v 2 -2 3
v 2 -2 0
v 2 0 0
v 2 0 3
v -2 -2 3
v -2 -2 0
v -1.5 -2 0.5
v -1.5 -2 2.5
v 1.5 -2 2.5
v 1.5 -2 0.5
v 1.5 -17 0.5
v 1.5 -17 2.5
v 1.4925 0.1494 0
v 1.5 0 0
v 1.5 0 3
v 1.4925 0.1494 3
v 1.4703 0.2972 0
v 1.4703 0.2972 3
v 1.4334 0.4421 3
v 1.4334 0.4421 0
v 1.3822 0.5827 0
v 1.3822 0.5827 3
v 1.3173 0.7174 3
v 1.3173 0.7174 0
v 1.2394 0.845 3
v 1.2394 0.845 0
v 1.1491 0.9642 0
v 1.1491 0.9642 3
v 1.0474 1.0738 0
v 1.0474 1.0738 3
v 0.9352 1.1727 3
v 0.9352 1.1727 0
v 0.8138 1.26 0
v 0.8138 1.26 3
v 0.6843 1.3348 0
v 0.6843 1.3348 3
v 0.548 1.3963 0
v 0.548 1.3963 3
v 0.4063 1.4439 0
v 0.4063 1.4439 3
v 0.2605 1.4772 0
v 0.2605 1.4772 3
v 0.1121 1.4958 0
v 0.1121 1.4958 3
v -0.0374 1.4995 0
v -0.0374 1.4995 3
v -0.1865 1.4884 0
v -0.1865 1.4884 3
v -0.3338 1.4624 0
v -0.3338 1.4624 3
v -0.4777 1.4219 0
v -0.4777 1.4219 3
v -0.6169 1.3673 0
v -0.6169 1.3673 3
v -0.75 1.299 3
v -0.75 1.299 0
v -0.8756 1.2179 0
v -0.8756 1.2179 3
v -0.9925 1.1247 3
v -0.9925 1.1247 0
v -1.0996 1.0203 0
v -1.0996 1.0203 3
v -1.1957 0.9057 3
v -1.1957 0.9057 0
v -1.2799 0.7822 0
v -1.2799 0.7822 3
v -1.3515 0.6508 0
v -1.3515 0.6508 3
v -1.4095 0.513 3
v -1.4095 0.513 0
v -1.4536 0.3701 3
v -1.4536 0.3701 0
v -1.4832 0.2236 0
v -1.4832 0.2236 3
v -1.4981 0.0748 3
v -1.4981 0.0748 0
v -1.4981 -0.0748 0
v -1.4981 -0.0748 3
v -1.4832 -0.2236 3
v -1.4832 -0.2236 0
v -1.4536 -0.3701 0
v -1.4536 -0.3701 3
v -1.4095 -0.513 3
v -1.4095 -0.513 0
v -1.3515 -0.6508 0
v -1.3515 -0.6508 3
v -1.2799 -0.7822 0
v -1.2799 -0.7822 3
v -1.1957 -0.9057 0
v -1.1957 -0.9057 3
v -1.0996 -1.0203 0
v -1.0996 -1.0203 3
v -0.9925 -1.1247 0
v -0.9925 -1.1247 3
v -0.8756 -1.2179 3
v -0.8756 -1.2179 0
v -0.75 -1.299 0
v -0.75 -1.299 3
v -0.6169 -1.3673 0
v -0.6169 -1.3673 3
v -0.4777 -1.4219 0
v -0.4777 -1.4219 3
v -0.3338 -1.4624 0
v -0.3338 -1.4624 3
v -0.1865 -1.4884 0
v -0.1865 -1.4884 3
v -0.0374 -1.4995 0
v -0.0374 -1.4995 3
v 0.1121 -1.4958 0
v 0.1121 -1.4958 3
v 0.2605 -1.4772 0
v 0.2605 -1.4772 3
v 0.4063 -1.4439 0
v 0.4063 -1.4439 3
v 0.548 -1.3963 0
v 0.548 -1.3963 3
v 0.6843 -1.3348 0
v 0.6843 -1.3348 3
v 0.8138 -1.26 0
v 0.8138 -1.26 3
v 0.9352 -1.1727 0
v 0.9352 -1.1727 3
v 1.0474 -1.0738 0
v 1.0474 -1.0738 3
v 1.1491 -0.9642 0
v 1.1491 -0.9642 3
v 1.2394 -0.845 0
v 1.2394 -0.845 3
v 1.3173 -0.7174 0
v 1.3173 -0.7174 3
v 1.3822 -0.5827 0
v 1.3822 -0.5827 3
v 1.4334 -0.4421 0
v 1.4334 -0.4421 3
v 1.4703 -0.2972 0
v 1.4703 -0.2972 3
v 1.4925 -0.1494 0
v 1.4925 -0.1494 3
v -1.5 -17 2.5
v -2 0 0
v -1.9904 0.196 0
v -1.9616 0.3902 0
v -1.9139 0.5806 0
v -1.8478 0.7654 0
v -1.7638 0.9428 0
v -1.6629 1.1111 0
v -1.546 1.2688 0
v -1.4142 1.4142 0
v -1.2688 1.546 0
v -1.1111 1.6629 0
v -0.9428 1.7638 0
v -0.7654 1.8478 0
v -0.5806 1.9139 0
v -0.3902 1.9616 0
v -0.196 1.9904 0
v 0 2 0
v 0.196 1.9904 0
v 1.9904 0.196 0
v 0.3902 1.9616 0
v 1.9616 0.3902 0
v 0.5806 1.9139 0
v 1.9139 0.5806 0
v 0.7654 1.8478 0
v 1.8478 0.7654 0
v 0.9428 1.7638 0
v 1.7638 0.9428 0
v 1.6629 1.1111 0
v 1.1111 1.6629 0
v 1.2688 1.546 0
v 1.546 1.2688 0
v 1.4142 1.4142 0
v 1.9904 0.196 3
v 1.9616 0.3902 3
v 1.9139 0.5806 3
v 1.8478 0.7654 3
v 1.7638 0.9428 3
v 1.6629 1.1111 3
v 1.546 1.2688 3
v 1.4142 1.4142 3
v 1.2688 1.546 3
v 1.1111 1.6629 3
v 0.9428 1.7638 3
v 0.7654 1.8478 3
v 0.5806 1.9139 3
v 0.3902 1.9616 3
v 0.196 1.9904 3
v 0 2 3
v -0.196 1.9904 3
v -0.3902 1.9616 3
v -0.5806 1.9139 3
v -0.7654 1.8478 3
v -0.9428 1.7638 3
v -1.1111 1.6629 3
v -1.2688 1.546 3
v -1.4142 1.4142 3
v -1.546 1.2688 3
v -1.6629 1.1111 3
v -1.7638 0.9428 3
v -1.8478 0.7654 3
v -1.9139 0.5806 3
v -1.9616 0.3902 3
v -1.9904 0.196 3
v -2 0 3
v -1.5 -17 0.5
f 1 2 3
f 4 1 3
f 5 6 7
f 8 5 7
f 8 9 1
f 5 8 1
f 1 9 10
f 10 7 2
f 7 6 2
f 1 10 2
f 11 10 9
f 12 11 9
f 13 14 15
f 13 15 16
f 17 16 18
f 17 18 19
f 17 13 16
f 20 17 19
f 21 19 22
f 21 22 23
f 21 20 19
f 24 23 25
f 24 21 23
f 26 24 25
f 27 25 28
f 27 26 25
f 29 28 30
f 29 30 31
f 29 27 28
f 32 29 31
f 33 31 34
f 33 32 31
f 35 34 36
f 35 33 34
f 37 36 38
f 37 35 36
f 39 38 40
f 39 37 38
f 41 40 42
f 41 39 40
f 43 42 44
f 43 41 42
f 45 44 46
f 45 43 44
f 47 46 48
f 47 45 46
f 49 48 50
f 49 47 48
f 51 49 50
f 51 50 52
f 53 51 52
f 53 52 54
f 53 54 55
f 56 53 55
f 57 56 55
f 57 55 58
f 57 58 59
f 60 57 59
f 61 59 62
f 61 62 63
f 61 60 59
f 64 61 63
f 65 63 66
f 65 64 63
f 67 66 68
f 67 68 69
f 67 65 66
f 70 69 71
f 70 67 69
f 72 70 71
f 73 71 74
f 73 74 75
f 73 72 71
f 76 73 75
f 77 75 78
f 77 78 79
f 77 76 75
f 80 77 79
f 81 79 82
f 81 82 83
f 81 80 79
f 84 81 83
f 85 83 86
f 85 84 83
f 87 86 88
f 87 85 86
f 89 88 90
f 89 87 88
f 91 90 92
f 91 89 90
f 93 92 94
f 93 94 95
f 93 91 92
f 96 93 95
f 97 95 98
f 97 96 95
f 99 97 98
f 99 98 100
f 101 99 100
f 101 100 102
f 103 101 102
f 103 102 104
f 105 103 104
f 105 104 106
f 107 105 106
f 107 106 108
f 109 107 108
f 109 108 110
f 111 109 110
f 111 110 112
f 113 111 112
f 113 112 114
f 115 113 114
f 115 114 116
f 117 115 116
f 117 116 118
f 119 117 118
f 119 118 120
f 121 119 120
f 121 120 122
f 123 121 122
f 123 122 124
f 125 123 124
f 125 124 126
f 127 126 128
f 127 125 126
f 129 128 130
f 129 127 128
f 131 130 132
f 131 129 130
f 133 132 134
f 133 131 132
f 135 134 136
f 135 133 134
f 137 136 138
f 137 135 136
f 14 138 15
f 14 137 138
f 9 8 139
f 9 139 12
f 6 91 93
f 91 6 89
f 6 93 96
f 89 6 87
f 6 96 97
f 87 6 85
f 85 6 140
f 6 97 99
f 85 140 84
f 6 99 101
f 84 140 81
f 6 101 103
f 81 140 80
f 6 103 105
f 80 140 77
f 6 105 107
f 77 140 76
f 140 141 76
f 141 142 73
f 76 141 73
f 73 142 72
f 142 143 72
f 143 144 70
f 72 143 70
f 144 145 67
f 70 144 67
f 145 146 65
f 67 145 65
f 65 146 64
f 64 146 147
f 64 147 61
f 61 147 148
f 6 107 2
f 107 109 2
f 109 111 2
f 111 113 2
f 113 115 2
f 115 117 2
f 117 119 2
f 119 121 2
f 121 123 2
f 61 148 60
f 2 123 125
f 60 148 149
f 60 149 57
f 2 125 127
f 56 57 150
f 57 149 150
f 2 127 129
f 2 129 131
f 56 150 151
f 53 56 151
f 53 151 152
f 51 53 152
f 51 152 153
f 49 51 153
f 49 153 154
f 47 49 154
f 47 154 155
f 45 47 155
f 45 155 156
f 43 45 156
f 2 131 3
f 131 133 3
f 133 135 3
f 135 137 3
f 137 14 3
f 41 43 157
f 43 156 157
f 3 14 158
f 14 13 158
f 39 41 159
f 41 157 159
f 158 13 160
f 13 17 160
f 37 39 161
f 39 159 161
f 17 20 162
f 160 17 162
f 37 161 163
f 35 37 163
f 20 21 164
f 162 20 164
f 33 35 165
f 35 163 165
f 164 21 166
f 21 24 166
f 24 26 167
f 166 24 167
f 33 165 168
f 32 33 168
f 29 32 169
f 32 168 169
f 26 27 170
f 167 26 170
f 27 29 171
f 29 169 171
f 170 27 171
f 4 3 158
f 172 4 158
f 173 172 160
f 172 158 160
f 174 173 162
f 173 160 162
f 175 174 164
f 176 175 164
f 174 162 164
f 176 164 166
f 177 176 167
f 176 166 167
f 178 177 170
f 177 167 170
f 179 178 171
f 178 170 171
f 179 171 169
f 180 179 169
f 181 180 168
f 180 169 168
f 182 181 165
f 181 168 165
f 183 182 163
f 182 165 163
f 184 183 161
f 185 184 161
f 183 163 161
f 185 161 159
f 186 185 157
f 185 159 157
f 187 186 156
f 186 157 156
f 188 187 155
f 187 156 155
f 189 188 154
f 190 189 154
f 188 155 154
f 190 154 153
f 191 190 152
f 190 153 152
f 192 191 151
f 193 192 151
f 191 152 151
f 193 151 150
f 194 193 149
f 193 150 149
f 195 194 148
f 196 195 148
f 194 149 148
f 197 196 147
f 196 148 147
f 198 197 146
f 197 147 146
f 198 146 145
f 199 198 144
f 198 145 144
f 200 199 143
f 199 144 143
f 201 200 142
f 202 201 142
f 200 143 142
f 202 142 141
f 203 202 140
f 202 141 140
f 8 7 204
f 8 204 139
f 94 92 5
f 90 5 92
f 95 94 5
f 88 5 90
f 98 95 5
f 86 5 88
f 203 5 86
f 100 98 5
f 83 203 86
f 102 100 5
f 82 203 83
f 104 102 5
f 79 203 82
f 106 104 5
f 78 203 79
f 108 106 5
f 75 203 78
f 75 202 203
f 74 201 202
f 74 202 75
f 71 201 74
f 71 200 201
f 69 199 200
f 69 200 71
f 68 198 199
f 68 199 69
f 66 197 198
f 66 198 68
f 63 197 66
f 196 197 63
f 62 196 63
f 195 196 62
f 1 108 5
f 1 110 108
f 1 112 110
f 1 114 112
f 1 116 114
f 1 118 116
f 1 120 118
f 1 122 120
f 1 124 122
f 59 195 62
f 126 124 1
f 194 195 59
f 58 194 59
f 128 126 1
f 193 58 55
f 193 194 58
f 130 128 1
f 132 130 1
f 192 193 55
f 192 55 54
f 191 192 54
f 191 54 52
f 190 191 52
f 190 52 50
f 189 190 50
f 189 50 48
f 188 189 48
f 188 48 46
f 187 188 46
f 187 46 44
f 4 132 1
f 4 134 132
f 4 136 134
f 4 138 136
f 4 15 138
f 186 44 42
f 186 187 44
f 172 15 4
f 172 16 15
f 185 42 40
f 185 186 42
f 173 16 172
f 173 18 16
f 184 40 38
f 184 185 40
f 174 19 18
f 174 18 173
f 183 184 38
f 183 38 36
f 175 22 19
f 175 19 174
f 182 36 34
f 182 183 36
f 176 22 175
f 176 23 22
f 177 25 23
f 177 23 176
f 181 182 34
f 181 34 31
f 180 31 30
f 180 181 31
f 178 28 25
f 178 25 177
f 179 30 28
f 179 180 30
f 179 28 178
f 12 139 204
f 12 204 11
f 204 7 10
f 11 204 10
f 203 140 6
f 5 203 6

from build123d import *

# Parameters (mm, degrees)
SKETCH_1_R      = 2
SKETCH_1_R_2    = 1.5
EXTRUDE_1_DEPTH = 3
SKETCH_2_W      = 3
SKETCH_2_H      = 2
EXTRUDE_2_DEPTH = 15


with BuildPart() as part:
    # 草图1 → 凸台-拉伸1 (new body)
    with BuildSketch(Plane.XY):
        with BuildLine():
            ThreePointArc((0, -2), (-1.414213562, -1.414213562), (-2, 0))
            Line((-2, 0), (-2, -2))
            Line((-2, -2), (0, -2))
        make_face()
        Circle(SKETCH_1_R)
        Circle(SKETCH_1_R_2, mode=Mode.SUBTRACT)
        with BuildLine():
            Line((2, -2), (2, 0))
            ThreePointArc((2, 0), (1.414213562, -1.414213562), (0, -2))
            Line((0, -2), (2, -2))
        make_face()
    extrude(amount=EXTRUDE_1_DEPTH)

    # 草图2 → 凸台-拉伸2 (add)
    with BuildSketch(Plane.XZ.offset(2)):
        with Locations((0, 1.5)):
            Rectangle(SKETCH_2_W, SKETCH_2_H)
    extrude(amount=EXTRUDE_2_DEPTH)


solid = part.part
